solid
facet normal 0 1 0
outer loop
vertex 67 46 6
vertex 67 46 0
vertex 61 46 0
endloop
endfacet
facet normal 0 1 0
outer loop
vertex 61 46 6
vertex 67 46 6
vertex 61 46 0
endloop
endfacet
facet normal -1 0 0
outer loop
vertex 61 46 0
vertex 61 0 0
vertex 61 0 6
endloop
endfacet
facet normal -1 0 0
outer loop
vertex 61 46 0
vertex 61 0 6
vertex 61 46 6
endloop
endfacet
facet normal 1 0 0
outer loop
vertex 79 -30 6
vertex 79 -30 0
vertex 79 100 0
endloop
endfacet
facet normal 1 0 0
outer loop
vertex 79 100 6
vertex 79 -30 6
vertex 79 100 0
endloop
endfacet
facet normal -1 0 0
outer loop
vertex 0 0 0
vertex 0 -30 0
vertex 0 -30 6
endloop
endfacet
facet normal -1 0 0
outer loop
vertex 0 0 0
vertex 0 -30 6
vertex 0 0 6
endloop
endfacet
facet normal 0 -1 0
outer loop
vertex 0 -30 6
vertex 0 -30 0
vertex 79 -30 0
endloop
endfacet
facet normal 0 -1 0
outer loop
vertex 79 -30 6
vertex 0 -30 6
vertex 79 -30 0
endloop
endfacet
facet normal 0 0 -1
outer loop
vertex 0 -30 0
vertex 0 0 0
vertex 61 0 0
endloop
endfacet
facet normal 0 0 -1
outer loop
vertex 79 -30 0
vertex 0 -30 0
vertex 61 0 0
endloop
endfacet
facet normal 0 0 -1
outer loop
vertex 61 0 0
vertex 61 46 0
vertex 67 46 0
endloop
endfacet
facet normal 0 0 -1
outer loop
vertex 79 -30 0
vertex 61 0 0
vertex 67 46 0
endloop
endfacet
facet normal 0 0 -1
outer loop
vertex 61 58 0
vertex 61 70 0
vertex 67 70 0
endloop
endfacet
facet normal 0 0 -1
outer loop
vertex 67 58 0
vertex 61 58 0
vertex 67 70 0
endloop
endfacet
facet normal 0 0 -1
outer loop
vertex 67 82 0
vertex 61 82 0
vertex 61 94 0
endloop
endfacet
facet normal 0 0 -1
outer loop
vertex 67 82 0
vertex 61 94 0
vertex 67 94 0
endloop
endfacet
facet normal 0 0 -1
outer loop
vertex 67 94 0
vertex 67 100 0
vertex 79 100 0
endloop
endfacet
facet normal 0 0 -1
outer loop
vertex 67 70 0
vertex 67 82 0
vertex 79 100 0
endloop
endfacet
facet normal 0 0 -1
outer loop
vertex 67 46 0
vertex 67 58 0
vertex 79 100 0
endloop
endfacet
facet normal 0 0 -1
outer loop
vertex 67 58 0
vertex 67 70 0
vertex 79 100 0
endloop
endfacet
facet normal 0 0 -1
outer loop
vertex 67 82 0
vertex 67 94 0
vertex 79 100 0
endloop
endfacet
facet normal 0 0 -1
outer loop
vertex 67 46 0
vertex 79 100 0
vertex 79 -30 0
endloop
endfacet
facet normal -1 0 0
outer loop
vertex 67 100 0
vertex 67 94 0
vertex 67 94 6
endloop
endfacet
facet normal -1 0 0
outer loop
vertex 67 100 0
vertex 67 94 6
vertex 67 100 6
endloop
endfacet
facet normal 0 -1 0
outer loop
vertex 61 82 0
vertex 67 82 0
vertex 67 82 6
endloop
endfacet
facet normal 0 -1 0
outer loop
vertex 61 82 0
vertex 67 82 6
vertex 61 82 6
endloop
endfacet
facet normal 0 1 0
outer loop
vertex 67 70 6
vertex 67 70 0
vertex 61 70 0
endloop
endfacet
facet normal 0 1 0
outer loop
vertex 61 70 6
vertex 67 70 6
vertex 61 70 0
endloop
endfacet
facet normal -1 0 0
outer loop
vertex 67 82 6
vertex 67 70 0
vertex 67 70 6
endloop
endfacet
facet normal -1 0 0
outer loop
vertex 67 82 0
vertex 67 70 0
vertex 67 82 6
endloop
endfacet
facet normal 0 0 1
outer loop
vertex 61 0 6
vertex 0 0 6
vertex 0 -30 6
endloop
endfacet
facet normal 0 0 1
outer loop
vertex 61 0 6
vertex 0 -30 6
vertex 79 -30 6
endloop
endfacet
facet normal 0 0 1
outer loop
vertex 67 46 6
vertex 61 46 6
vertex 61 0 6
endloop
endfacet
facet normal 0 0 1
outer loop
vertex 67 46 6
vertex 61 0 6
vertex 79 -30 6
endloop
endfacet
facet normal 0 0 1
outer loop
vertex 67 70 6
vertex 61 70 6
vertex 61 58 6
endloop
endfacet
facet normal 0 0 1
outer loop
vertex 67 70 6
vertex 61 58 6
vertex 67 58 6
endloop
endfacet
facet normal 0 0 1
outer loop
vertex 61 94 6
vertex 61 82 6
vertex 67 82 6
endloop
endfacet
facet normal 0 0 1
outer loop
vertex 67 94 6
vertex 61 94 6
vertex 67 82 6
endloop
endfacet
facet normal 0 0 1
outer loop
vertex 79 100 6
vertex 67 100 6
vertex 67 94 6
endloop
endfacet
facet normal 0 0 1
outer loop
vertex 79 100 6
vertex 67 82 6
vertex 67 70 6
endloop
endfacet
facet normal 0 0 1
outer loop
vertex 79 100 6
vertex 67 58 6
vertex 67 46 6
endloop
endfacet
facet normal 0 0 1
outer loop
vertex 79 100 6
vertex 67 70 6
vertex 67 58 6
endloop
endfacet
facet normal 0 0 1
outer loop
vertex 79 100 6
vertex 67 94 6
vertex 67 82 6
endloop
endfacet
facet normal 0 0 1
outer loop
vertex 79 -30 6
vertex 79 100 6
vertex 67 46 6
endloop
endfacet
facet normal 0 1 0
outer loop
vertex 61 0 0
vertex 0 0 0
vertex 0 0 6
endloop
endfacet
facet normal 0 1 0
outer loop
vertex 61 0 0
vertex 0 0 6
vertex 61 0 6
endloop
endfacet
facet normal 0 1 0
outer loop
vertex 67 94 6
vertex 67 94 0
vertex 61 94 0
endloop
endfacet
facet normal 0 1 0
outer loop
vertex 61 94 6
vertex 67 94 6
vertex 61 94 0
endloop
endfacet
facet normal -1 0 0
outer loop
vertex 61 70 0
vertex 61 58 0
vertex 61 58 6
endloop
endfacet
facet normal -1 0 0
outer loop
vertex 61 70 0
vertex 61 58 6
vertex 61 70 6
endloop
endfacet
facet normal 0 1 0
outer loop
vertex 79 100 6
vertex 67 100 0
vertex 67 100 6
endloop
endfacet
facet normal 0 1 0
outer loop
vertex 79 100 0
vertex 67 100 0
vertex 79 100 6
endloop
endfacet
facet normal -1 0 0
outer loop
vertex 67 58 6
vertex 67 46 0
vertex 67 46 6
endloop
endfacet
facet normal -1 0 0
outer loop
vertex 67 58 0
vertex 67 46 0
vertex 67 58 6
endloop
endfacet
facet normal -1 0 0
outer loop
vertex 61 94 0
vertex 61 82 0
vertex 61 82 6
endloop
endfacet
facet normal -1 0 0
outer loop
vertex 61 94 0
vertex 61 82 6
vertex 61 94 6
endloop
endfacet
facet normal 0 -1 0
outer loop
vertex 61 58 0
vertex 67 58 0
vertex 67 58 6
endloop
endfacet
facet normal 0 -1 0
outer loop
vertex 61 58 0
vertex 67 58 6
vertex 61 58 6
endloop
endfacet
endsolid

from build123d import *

# Parameters (mm, degrees)
SKETCH1_W           = 18
SKETCH1_H           = 100
BOSS_EXTRUDE4_DEPTH = 6
BOSS_EXTRUDE5_DEPTH = 6
CUT_EXTRUDE1_REACH  = 129.581
SKETCH4_W           = 6
SKETCH4_H           = 12


with BuildPart() as part:
    # Sketch1 → Boss-Extrude4 (new body)
    with BuildSketch(Plane.XY):
        with Locations((70, 50)):
            Rectangle(SKETCH1_W, SKETCH1_H)
    extrude(amount=BOSS_EXTRUDE4_DEPTH)

    # Sketch1<8> → Boss-Extrude5 (add)
    with BuildSketch(Plane.XY):
        Polygon((79, -30), (79, 0), (61, 0), (20, 0), (0, 0), (0, -30), align=None)
    extrude(amount=BOSS_EXTRUDE5_DEPTH)

    # Sketch4 → Cut-Extrude1 (cut, up to next)
    with BuildSketch(Plane(origin=(0, 0, 0), x_dir=(-1, 0, 0), z_dir=(0, 0, -1)), mode=Mode.PRIVATE) as cut_extrude1_sk1:
        with Locations((-64, 100)):
            Rectangle(SKETCH4_W, SKETCH4_H)
    cut_extrude1_tool1 = extrude(cut_extrude1_sk1.sketch, amount=-CUT_EXTRUDE1_REACH, mode=Mode.PRIVATE) & part.part
    # Sketch4 → Cut-Extrude1 (cut, up to next)
    with BuildSketch(Plane(origin=(0, 0, 0), x_dir=(-1, 0, 0), z_dir=(0, 0, -1)), mode=Mode.PRIVATE) as cut_extrude1_sk2:
        with Locations((-64, 76)):
            Rectangle(SKETCH4_W, SKETCH4_H)
    cut_extrude1_tool2 = extrude(cut_extrude1_sk2.sketch, amount=-CUT_EXTRUDE1_REACH, mode=Mode.PRIVATE) & part.part
    # Sketch4 → Cut-Extrude1 (cut, up to next)
    with BuildSketch(Plane(origin=(0, 0, 0), x_dir=(-1, 0, 0), z_dir=(0, 0, -1)), mode=Mode.PRIVATE) as cut_extrude1_sk3:
        with Locations((-64, 52)):
            Rectangle(SKETCH4_W, SKETCH4_H)
    cut_extrude1_tool3 = extrude(cut_extrude1_sk3.sketch, amount=-CUT_EXTRUDE1_REACH, mode=Mode.PRIVATE) & part.part
    add(cut_extrude1_tool1.solids().sort_by_distance((64, 100, 0))[0], mode=Mode.SUBTRACT)
    add(cut_extrude1_tool2.solids().sort_by_distance((64, 76, 0))[0], mode=Mode.SUBTRACT)
    add(cut_extrude1_tool3.solids().sort_by_distance((64, 52, 0))[0], mode=Mode.SUBTRACT)


solid = part.part
